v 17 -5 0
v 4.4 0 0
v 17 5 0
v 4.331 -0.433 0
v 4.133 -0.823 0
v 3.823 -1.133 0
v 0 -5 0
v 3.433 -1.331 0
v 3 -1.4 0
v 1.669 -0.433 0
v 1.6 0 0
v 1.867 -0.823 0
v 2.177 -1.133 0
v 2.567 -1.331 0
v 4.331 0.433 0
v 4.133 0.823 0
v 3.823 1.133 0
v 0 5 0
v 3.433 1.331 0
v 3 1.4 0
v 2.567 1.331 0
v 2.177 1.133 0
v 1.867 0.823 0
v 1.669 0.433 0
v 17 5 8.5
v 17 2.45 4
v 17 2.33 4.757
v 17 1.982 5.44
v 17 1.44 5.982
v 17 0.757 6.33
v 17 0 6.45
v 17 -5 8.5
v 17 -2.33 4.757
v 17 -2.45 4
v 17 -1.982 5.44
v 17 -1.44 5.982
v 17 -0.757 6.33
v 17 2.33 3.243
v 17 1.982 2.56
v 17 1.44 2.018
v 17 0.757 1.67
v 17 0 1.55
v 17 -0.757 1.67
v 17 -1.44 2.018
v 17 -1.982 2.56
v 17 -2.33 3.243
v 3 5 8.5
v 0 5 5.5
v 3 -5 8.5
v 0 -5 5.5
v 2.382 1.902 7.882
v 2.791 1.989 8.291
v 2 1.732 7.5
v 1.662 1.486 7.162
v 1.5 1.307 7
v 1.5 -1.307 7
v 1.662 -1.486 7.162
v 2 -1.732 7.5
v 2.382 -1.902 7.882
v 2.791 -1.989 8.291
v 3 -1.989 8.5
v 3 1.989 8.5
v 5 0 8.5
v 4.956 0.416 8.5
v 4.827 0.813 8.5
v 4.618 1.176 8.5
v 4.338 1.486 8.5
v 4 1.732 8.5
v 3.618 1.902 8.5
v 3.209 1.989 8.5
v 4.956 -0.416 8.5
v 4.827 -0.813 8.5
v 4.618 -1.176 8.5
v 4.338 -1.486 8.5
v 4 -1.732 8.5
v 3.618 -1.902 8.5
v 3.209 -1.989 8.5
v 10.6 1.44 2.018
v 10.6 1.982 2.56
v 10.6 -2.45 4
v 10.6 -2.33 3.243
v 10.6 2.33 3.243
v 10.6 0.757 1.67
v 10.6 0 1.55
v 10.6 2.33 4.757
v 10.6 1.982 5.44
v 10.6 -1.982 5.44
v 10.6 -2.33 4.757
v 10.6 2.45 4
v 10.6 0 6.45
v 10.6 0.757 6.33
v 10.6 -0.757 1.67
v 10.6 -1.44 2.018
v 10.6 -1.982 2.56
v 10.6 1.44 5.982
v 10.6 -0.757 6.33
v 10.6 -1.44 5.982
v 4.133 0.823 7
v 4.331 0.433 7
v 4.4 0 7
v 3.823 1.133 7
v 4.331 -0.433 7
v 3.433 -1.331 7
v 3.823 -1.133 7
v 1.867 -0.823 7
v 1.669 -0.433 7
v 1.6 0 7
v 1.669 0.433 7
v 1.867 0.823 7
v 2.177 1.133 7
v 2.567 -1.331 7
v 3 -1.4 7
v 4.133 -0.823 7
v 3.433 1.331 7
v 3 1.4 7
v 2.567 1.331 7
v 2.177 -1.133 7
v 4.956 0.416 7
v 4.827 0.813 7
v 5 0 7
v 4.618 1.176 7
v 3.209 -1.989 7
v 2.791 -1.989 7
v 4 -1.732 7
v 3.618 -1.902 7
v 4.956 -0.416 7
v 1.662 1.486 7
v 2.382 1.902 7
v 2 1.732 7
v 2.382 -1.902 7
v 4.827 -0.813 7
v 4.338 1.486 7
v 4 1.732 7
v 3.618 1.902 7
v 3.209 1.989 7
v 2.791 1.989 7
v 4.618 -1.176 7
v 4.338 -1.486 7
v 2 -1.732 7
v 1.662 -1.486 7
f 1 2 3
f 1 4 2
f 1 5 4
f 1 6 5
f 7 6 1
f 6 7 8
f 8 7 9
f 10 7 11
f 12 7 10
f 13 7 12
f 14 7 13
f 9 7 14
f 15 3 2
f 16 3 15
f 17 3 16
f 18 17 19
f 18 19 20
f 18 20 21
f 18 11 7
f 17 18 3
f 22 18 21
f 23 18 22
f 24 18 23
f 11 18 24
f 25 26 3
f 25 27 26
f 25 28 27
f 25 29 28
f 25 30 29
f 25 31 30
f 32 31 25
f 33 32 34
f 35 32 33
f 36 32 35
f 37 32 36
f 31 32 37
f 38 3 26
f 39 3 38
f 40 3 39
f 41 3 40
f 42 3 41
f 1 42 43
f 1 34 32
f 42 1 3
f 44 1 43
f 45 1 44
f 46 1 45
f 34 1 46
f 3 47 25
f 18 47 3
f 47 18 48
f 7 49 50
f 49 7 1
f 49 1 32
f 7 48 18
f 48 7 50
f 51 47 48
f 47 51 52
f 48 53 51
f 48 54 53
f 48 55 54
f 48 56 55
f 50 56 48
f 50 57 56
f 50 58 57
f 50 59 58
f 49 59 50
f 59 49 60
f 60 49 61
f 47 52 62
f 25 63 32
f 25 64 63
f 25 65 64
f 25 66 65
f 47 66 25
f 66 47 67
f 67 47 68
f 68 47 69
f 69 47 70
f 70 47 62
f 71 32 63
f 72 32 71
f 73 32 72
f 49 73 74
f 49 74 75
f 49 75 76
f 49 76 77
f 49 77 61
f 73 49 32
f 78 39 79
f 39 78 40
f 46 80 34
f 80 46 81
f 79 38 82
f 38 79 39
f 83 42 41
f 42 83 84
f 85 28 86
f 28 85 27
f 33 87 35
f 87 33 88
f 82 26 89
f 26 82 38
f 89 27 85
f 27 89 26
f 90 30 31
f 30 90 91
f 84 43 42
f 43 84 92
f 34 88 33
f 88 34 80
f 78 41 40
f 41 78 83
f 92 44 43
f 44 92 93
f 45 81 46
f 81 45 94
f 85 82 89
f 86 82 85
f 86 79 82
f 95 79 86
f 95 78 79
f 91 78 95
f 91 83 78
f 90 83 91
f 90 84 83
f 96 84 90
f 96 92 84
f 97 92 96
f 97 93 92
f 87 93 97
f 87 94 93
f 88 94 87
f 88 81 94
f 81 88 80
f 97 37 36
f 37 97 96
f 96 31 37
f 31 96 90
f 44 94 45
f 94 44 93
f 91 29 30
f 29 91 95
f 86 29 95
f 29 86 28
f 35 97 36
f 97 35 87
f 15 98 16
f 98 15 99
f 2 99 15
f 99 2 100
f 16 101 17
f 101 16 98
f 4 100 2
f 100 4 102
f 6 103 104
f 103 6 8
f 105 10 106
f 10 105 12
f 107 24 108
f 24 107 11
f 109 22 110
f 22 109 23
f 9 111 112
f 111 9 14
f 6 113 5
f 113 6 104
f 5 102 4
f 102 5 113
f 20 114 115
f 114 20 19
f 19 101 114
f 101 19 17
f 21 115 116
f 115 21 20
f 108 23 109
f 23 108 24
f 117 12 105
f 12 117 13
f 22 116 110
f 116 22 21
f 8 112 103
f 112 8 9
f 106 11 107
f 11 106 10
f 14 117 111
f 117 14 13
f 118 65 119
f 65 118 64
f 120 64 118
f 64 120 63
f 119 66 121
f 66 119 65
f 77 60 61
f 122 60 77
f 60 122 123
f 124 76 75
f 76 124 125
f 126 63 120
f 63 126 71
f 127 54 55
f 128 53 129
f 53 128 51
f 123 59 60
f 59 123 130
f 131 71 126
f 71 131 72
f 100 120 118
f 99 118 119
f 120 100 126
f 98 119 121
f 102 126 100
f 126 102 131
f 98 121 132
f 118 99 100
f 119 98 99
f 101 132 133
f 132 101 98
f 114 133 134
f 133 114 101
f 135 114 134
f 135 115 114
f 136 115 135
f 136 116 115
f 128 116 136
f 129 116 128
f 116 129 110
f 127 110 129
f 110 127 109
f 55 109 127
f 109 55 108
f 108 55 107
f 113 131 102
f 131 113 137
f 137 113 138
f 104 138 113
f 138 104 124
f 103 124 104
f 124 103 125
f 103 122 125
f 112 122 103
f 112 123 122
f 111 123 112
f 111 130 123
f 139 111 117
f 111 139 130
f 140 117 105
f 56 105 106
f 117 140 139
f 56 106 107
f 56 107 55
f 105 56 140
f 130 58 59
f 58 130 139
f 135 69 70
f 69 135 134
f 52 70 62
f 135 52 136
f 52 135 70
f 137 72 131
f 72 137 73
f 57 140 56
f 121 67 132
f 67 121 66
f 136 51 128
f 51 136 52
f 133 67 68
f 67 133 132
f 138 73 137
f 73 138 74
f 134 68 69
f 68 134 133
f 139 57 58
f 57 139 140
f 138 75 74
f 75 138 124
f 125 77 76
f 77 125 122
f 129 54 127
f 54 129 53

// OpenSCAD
difference() {
  translate([0,5,0]) rotate ([90,0,0])
    linear_extrude(height=10) polygon([[0,0], [17,0], [17,8.5], [3,8.5], [0,5.5]]);
  translate([10.6,0,4]) rotate([0,90,0]) cylinder(d=4.9,h=6.5,$fn=20);

  translate([3,0,-1]) cylinder(d=2.8,h=12,$fn=20);
  translate([3,0,7]) cylinder(d=4,h=4, $fn=30);
}
